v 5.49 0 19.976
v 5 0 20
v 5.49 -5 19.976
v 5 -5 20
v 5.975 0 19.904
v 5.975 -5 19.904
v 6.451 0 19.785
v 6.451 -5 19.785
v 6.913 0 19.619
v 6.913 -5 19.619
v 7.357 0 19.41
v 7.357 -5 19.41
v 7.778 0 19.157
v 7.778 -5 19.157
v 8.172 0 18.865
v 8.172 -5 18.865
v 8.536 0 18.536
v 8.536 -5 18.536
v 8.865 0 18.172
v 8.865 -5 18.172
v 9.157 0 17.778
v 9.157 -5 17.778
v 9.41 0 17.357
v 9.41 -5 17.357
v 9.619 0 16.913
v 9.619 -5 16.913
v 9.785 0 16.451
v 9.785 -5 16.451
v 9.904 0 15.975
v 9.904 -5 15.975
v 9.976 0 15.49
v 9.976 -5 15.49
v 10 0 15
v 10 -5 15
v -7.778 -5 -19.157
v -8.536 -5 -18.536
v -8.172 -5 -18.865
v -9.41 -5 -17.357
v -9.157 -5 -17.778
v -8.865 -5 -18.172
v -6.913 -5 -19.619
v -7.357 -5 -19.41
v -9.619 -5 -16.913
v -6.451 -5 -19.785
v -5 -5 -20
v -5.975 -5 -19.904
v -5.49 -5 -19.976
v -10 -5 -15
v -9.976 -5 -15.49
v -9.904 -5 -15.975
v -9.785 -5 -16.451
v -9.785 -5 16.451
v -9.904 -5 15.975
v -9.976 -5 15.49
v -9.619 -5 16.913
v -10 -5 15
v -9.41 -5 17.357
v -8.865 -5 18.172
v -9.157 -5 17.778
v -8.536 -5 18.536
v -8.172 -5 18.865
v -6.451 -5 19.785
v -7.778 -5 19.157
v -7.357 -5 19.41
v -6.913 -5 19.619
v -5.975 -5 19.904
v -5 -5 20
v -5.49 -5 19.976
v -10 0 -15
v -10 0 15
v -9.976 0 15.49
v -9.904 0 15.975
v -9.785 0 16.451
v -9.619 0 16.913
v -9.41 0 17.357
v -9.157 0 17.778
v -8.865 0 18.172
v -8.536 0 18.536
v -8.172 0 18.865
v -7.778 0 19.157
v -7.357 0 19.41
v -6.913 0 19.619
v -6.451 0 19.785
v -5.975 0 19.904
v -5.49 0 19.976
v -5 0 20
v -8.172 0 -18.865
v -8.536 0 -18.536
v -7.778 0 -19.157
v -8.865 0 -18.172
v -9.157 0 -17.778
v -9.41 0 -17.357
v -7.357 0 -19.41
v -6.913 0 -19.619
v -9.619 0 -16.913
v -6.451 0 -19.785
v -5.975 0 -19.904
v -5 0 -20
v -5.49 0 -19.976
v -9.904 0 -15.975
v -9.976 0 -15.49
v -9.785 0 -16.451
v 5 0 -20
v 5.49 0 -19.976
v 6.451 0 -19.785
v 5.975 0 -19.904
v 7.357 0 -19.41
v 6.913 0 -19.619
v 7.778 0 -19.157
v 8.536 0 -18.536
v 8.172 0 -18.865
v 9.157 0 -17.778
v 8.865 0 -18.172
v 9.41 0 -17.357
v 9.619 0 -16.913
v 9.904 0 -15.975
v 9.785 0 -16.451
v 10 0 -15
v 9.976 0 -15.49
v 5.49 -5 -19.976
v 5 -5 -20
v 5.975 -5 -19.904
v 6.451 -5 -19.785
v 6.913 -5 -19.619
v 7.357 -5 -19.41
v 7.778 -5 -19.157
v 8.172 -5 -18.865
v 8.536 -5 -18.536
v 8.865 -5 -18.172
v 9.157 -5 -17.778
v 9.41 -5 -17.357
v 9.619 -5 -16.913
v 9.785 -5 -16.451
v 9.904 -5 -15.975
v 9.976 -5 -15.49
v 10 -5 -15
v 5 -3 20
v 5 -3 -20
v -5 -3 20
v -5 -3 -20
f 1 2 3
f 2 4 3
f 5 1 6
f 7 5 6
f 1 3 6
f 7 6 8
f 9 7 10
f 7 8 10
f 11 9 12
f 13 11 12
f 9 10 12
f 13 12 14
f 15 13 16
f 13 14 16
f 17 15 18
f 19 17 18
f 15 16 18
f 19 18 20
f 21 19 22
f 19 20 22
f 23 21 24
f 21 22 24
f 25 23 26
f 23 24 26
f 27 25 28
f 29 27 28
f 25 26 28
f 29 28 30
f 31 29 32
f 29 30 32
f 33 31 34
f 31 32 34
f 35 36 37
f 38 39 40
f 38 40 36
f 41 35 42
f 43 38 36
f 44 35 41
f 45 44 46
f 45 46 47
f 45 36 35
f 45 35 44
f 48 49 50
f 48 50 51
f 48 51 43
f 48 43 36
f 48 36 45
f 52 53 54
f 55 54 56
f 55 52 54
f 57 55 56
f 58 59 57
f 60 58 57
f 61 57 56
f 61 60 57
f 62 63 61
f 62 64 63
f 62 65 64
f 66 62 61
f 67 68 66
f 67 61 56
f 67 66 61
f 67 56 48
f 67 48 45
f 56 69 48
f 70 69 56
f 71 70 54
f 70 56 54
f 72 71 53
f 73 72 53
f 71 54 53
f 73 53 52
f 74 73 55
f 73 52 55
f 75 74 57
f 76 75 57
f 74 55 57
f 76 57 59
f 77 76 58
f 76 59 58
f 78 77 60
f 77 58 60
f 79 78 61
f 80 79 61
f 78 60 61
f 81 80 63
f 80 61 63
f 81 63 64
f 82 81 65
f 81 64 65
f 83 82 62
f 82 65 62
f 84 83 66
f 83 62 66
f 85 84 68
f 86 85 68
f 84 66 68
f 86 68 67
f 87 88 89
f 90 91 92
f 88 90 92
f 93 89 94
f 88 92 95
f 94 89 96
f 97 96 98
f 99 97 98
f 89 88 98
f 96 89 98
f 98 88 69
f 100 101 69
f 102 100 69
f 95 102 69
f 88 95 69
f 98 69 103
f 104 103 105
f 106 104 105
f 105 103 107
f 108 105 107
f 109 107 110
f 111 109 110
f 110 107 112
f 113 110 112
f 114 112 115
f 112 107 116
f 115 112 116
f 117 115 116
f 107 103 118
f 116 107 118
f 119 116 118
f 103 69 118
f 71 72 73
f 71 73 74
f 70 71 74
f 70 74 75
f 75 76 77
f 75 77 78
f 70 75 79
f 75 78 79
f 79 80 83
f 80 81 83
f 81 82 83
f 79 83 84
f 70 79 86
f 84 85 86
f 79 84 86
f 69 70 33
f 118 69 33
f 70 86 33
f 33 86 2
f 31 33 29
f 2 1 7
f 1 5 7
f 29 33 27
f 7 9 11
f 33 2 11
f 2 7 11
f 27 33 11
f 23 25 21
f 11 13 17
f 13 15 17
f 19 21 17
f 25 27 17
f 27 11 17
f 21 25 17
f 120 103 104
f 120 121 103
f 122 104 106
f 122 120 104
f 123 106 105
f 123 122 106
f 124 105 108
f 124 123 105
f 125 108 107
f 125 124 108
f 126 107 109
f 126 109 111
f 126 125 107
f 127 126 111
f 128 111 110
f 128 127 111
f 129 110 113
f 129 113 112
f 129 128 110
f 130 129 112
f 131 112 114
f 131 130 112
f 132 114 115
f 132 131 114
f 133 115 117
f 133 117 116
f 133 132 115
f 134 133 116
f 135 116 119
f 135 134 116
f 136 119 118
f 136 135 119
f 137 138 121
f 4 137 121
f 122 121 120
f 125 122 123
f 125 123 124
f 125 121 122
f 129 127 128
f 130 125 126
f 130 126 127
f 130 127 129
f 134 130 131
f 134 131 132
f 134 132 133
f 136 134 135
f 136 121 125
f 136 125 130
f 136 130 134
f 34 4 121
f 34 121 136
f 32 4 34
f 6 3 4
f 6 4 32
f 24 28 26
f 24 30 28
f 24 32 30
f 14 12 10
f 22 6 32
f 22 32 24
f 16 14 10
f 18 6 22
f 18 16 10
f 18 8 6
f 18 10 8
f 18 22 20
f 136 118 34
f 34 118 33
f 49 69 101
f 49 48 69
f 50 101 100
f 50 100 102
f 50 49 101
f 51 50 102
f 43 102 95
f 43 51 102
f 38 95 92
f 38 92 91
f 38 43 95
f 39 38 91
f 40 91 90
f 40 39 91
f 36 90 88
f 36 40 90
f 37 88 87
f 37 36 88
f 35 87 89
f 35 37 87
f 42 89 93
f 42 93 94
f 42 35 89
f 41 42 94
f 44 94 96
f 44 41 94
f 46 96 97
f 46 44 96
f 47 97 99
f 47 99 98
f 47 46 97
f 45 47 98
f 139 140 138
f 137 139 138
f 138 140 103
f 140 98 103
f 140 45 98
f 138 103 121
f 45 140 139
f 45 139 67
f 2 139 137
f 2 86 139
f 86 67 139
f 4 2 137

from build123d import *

# Parameters (mm, degrees)
F0_W     = 20
F0_H     = 40
F1_DEPTH = 5
F2_W     = 5
F2_H     = 2
F3_DEPTH = 40.001
F4_R     = 4.99999


# Not quite as in the source:
# - a fillet or chamfer is up to 0.001 mm smaller than in the source, because OpenCascade refuses the exact size


with BuildPart() as f1:
    # F0 (on Front) → F1 (new body)
    with BuildSketch(Plane.XZ):
        Rectangle(F0_W, F0_H)
    extrude(amount=F1_DEPTH)

    # F2 (on face) → F3 (cut, through all)
    with BuildSketch(Plane(origin=(0, 0, -20), x_dir=(1, 0, 0), z_dir=(0, 0, -1))):
        with Locations((-2.5, 4)):
            Rectangle(F2_W, F2_H)
        with Locations((2.5, 4)):
            Rectangle(F2_W, F2_H)
    extrude(amount=-F3_DEPTH, mode=Mode.SUBTRACT)

    # F4 (radius 5 in the source; OpenCascade refuses exactly that, so slightly less here)
    f4_edges = [f1.edges().sort_by_distance(p)[0] for p in [
        (-10, -2.5, -20),
        (10, -2.5, -20),
        (-10, -2.5, 20),
        (10, -2.5, 20),
    ]]
    fillet(f4_edges, radius=F4_R)


solid = f1.part
